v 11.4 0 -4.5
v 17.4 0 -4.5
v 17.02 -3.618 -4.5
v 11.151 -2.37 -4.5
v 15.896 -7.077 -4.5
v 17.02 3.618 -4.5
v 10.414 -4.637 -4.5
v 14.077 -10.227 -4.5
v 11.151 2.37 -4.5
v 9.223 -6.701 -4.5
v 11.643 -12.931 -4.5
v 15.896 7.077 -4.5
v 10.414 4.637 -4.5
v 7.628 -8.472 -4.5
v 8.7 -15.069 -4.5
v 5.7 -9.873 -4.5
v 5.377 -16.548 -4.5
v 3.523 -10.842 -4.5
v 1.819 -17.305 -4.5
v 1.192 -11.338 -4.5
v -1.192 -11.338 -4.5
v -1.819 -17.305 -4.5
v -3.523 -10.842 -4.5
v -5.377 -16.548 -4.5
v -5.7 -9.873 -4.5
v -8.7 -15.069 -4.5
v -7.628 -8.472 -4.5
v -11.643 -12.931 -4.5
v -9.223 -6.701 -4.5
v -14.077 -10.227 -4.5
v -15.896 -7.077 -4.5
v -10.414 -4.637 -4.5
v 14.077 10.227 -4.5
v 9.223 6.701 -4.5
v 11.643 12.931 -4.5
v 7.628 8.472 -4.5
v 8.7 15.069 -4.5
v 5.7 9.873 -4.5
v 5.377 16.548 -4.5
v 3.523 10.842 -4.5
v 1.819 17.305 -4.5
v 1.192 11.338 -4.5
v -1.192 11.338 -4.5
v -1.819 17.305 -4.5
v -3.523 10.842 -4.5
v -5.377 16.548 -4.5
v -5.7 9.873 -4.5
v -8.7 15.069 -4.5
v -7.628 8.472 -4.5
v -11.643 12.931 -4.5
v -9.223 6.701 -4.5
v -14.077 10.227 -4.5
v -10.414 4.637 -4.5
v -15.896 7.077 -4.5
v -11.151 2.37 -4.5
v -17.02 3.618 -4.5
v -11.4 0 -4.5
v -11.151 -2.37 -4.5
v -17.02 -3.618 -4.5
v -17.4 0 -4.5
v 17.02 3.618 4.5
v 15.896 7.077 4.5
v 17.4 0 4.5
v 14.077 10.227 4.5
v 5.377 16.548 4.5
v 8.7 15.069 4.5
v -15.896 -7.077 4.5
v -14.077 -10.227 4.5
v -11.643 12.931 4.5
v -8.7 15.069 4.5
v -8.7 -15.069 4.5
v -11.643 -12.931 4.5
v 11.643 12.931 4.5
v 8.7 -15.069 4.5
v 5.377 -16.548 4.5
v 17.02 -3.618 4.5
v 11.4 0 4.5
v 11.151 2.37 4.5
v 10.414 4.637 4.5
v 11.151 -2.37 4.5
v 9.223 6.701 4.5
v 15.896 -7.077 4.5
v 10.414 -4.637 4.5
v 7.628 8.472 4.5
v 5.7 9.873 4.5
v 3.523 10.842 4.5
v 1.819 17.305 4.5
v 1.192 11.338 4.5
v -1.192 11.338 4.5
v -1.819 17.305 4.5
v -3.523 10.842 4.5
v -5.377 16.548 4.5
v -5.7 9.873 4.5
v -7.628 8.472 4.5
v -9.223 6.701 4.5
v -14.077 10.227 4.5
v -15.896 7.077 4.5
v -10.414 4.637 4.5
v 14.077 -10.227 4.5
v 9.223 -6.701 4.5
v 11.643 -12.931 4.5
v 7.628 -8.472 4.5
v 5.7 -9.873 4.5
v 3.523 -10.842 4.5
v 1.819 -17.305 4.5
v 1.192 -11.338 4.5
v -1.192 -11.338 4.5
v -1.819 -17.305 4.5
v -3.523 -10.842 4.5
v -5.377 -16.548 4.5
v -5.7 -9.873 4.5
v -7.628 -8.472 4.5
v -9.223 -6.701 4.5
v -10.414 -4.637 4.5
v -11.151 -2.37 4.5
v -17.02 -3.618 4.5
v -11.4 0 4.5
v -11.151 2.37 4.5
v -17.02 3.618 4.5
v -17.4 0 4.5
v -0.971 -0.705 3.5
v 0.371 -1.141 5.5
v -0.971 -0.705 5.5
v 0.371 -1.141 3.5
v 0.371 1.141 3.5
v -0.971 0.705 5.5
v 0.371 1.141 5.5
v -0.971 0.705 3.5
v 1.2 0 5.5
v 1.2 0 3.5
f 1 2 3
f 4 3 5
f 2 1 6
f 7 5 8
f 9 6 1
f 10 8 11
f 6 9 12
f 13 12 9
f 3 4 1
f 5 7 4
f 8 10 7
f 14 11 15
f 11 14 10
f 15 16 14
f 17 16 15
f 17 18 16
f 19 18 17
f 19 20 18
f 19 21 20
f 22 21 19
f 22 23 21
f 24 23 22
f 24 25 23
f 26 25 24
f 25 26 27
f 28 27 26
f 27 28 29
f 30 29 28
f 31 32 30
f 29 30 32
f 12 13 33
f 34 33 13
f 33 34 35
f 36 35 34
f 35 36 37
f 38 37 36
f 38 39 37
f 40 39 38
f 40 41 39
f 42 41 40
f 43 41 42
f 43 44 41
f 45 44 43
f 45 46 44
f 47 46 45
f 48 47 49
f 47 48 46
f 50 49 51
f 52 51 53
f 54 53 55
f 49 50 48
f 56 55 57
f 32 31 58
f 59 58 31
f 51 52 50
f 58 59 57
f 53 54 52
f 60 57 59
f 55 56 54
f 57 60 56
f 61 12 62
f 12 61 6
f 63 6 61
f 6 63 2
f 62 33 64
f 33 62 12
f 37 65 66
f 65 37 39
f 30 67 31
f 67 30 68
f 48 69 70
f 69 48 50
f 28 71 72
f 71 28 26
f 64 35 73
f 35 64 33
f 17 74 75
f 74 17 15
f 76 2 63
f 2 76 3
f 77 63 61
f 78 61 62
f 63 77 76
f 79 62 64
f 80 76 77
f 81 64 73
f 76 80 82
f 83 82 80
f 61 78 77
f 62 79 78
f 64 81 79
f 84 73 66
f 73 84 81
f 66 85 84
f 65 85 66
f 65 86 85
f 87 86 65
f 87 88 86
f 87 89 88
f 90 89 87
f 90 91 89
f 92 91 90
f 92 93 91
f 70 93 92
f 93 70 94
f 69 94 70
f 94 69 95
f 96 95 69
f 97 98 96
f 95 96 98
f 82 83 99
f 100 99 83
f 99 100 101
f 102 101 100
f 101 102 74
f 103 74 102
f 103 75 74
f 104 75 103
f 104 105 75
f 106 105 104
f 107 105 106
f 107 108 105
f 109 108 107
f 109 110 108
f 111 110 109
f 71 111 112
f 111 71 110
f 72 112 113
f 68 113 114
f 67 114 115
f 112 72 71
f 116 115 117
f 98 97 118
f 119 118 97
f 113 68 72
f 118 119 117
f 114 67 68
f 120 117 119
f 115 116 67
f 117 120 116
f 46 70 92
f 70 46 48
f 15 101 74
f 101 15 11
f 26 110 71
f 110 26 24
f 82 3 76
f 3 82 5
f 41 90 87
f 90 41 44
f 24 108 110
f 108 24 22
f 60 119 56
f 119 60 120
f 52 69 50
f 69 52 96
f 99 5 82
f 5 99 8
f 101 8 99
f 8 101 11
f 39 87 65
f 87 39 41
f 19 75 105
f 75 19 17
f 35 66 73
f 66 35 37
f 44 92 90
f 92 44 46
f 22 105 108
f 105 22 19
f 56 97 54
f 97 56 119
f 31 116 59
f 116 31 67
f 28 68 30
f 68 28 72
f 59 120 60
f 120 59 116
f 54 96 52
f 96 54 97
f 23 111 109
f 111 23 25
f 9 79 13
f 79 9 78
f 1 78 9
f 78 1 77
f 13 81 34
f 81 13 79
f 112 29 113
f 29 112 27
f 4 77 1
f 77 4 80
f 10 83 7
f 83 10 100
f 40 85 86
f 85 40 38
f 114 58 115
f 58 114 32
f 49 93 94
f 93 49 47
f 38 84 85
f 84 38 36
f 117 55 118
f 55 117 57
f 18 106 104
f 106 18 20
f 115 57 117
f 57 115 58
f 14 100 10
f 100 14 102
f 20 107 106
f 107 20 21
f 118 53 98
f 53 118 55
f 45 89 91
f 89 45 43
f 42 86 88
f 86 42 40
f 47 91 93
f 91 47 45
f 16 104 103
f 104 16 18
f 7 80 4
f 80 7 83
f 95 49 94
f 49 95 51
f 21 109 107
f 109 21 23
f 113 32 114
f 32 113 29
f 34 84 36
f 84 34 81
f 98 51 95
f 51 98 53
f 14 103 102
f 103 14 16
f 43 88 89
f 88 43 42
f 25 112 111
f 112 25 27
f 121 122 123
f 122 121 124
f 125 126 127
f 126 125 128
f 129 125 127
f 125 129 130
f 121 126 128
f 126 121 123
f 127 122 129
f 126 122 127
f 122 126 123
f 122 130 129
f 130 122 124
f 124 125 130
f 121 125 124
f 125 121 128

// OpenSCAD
// Parameters
outer_radius = 17.4; //[8.7:34.8:0.1]
inner_radius = 11.4; //[5.7:22.8:0.1]
height = 9; //[4.5:18:0.1]
wall_thickness = 0.5; //[0.25:1:0.05]
overlap = 1; //[0.5:2:0.1]
chamfer_size = 1; //[0.5:2:0.1]
axis_marker_radius = 1.2; //[0.6:2.4:0.1]
axis_marker_height = 2; //[1:4:0.1]

// Base Shapes
module revolved_main_body() {
  color("Silver")
  cylinder(r=outer_radius, h=height, center=true);
}

module inner_bore() {
  cylinder(r=inner_radius, h=height + 2*overlap, center=true);
}

module wall_shell_outer() {
  cylinder(r=inner_radius + wall_thickness, h=height, center=true);
}

module wall_shell_inner_void() {
  cylinder(r=inner_radius, h=height + 2*overlap, center=true);
}

module edge_fillet_chamfer() {
  rotate_extrude() {
    polygon(points=[
      [outer_radius - chamfer_size, height/2 - chamfer_size],
      [outer_radius, height/2 - chamfer_size],
      [outer_radius, height/2]
    ]);
  }
}

module reference_axis_marker() {
  color("DimGray")
  translate([0, 0, height/2 + axis_marker_height/2 - overlap])
  cylinder(r=axis_marker_radius, h=axis_marker_height, center=true);
}

// Operations
module wall_shell() {
  difference() {
    wall_shell_outer();
    wall_shell_inner_void();
  }
}

module main_body_with_bore() {
  difference() {
    revolved_main_body();
    inner_bore();
  }
}

module body_plus_shell() {
  union() {
    main_body_with_bore();
    wall_shell();
  }
}

module body_plus_shell_plus_chamfer() {
  union() {
    body_plus_shell();
    edge_fillet_chamfer();
  }
}

module complete_model() {
  union() {
    body_plus_shell_plus_chamfer();
    reference_axis_marker();
  }
}

// Final Output
complete_model();
